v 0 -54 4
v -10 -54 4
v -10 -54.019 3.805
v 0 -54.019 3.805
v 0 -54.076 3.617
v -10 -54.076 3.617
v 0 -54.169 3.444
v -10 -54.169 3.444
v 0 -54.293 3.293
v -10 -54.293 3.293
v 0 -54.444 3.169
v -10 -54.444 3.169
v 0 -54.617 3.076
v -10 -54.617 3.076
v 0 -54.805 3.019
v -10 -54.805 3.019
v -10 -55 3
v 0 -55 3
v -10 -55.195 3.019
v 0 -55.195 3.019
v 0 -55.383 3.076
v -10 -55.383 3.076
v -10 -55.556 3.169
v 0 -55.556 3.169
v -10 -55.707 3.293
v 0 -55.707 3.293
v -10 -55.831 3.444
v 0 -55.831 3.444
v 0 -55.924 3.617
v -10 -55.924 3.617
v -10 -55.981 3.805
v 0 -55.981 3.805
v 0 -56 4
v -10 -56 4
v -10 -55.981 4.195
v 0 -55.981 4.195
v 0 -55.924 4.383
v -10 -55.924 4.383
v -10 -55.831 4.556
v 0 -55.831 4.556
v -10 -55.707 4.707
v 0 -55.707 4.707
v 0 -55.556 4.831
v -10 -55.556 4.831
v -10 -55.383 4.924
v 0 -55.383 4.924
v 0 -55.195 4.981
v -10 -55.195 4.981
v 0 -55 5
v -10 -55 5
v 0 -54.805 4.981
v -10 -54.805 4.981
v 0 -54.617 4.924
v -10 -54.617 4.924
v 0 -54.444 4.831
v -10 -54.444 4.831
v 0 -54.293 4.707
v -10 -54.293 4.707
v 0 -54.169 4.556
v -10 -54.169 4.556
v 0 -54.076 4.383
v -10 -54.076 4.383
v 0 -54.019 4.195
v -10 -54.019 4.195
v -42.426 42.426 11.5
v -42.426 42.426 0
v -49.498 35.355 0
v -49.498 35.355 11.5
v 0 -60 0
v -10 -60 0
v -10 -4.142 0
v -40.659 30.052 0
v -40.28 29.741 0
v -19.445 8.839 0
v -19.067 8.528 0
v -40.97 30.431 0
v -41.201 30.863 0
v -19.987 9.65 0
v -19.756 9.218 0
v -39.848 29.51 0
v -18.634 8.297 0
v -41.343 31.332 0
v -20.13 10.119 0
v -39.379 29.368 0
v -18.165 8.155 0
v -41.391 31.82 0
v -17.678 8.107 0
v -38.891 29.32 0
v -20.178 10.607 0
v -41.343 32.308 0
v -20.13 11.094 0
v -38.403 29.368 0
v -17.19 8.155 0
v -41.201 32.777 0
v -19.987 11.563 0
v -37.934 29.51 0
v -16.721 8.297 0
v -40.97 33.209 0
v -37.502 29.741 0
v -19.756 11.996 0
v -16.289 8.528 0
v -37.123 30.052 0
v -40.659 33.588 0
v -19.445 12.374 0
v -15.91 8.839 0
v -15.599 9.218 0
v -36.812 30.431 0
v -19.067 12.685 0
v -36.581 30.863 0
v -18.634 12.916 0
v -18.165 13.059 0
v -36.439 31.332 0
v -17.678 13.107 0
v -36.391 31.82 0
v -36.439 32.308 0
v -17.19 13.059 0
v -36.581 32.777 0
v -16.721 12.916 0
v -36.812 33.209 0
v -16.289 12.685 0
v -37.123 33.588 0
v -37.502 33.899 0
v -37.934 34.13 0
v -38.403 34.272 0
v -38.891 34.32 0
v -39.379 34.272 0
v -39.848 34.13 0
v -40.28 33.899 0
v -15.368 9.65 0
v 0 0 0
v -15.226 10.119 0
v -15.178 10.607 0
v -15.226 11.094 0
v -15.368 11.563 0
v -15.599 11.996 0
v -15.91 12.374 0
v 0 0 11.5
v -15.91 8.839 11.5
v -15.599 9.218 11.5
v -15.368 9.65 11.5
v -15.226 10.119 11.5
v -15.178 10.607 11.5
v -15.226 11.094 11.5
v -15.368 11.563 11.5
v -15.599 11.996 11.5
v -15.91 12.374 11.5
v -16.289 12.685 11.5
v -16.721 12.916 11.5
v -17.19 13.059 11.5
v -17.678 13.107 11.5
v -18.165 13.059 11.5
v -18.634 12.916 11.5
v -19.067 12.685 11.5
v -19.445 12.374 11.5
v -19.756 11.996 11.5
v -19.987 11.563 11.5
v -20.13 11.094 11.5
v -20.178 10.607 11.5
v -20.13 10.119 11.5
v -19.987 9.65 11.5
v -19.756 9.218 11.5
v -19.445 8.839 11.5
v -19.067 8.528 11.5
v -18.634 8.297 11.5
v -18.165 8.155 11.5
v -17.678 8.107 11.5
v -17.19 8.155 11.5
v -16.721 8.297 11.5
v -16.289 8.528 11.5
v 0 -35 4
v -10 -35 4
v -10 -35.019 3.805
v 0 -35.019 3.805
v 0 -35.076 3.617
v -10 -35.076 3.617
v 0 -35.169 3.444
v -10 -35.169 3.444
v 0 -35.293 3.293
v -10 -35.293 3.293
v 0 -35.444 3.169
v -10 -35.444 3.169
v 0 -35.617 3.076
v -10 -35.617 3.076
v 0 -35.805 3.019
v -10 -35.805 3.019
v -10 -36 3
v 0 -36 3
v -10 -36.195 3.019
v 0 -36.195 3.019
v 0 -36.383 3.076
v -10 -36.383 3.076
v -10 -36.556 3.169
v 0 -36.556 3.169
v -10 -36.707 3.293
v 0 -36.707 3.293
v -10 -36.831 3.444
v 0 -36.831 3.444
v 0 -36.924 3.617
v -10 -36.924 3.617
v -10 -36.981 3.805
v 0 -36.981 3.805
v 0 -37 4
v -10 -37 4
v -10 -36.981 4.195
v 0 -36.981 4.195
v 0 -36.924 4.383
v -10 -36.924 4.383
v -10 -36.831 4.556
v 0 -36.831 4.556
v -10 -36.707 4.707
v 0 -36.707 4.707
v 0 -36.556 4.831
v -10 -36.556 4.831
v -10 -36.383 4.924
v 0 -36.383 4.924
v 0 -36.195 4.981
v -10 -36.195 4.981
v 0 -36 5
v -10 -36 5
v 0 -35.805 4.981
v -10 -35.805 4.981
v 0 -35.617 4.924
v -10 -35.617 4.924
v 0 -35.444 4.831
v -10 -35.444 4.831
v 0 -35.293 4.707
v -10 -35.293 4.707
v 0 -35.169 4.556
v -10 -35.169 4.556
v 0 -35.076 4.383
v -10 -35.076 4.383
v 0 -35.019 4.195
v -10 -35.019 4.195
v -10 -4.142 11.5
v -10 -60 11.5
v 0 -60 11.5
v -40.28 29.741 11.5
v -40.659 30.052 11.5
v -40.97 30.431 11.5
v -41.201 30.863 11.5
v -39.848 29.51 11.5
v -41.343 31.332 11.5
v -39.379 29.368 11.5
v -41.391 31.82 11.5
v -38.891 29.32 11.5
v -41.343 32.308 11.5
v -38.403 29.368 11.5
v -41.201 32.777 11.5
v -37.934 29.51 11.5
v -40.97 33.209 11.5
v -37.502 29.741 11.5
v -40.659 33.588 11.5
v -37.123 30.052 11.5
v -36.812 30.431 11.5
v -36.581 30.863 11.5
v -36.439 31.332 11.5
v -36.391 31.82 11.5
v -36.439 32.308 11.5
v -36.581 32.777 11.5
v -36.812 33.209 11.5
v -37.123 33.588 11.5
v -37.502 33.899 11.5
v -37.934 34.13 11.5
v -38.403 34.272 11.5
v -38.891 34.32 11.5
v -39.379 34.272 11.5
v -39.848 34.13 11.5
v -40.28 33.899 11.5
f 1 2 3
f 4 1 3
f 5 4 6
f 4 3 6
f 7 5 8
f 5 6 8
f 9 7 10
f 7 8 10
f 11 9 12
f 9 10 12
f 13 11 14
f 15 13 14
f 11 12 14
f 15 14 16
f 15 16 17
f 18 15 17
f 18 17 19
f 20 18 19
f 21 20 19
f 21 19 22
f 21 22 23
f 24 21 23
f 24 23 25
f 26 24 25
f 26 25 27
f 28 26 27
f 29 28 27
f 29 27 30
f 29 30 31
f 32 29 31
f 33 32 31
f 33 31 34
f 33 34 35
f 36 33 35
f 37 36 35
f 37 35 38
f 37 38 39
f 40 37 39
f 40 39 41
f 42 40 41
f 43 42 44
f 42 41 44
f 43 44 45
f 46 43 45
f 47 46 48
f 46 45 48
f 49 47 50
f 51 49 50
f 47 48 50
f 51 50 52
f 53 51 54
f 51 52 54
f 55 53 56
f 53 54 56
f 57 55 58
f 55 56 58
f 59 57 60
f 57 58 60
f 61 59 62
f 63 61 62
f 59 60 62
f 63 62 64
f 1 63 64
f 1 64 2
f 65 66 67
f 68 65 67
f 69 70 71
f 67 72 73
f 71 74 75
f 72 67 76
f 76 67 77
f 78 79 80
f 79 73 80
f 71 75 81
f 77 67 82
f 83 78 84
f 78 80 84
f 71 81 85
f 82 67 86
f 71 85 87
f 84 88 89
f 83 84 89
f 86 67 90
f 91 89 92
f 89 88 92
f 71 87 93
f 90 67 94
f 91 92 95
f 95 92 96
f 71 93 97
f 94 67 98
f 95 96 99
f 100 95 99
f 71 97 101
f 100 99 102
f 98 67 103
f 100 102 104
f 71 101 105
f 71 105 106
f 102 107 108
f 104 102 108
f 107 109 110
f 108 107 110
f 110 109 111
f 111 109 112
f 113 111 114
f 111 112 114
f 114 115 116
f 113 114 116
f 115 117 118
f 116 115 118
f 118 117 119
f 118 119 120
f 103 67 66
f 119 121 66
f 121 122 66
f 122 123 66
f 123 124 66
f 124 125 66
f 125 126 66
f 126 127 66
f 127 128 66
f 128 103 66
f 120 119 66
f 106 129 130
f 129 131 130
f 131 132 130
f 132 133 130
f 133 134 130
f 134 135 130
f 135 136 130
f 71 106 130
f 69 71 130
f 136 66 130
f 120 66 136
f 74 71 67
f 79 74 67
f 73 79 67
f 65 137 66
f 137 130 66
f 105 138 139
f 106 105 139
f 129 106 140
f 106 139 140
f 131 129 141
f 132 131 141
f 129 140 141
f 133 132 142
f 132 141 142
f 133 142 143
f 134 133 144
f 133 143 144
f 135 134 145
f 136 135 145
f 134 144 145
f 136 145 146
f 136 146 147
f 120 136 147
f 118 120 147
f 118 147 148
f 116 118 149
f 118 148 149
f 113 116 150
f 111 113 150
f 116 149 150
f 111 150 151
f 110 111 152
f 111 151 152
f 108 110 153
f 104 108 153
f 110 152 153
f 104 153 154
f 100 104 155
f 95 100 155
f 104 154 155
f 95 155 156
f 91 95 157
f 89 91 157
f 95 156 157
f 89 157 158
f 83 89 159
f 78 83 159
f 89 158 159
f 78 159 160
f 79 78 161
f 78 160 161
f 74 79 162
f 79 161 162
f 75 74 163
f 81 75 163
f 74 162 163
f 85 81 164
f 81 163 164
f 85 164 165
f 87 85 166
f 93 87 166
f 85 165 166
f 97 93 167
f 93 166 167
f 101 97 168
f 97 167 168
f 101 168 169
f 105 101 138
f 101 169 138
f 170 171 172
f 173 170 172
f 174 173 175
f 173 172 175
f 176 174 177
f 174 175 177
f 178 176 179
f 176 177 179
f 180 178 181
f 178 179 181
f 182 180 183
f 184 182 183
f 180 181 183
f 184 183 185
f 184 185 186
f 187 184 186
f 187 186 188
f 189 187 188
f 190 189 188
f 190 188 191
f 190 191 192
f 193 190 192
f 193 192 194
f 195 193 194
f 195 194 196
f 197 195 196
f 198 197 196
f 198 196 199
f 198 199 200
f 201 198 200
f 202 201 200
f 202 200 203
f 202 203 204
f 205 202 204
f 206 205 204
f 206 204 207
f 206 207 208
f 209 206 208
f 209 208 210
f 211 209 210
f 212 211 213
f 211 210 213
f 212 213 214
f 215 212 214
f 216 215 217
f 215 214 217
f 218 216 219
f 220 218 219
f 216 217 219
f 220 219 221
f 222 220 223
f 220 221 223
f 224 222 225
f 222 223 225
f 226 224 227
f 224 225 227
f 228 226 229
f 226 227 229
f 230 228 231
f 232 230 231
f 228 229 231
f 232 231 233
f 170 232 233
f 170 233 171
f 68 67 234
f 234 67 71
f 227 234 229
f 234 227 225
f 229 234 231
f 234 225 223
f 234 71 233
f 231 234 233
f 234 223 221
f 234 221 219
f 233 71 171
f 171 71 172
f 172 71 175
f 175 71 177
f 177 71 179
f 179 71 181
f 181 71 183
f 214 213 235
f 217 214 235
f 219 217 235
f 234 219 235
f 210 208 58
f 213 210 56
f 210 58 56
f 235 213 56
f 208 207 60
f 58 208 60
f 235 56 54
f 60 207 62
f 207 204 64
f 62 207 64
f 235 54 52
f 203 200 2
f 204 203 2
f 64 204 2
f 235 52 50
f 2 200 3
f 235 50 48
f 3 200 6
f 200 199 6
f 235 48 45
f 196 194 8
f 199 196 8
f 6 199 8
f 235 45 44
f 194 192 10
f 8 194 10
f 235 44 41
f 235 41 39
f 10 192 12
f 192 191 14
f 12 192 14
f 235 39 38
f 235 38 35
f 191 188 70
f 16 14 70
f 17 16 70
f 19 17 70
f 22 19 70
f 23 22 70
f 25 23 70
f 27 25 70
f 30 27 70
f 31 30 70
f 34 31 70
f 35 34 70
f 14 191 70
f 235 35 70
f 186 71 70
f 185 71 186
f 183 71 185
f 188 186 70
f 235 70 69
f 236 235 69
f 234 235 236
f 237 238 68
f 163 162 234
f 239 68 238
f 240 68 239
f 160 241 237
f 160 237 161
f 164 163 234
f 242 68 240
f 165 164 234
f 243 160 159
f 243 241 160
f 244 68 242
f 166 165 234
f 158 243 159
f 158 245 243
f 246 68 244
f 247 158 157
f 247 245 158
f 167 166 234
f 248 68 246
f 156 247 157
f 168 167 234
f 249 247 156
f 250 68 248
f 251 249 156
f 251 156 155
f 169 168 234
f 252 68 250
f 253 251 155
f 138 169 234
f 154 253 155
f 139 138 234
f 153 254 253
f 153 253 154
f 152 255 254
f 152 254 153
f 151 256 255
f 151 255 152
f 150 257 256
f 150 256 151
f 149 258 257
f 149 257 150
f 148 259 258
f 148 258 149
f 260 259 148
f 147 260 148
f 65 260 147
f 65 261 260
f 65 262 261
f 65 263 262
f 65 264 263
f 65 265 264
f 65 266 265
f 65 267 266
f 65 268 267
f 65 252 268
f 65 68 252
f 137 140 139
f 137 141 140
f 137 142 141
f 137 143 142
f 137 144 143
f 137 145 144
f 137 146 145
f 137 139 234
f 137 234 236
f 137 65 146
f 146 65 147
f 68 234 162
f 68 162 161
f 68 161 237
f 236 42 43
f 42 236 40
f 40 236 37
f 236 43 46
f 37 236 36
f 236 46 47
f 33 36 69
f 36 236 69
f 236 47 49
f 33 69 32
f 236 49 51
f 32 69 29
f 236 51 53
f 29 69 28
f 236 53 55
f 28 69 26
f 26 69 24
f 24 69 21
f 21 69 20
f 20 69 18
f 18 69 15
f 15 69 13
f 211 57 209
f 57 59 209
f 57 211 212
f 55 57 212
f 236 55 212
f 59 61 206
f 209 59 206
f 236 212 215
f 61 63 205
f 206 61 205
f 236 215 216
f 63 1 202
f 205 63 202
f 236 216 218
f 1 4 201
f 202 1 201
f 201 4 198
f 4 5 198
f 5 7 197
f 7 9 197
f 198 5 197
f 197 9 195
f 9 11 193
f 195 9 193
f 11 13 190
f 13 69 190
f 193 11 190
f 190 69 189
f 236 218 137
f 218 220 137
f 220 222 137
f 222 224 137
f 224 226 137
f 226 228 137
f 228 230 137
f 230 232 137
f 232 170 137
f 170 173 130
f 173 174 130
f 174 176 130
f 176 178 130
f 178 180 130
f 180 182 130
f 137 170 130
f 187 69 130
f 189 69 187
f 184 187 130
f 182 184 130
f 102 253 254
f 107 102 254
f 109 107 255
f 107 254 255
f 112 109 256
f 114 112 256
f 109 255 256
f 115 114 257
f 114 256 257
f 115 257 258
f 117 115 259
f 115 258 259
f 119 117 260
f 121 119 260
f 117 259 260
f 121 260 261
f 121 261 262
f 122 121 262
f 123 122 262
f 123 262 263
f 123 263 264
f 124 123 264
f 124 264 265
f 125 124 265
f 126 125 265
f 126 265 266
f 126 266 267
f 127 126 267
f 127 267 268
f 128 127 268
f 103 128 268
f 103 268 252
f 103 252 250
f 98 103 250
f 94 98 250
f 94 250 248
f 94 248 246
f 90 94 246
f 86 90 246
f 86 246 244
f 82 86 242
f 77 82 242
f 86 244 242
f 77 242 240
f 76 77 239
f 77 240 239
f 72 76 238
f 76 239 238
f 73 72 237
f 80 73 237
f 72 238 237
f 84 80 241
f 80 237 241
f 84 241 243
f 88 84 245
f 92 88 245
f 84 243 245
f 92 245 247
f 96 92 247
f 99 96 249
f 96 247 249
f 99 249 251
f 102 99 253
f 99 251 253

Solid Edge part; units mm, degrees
sketch "Sketch1" plane through (0, 0, 0) normal (0, 0, 1) x (1, 0, 0)
  line L0 (-10, -60) -> (0, -60)
  line L1 (0, -60) -> (0, 0)
  line L2 (0, 0) -> (-42.4264, 42.4264)
  line L3 (-42.4264, 42.4264) -> (-49.4975, 35.3553)
  line L4 (-49.4975, 35.3553) -> (-10, -4.1421)
  line L5 (-10, -4.1421) -> (-10, -60)
  dimension "D1" = 10
  dimension "D2" = 10
  dimension "D3" = 60
  dimension "D4" = 60
extrude "Extrusionsausprägung_3" add sketch "Sketch1" along normal blind 11.5
sketch "Sketch2" plane through (-24.7487, -3.7868, 11.5) normal (0, 0, 1) x (0.7071, -0.7071, 0)
  circle A0 centre (-35.1777, 15.1777) radius 2.5
  circle A1 centre (-5.1777, 15.1777) radius 2.5
  dimension "D1" = 30
  dimension "D2" = 5
  dimension "D3" = 20
extrude "Cutout1" cut sketch "Sketch2" against normal up to next
sketch "Sketch3" plane through (-10, -32.0711, 5) normal (-1, 0, 0) x (0, 1, 0)
  circle A0 centre (-3.9289, 1) radius 1
  circle A1 centre (-22.9289, 1) radius 1
  dimension "D1" = 2
  dimension "D2" = 19
  dimension "D3" = 5
  dimension "D4" = 4
extrude "Cutout2" cut sketch "Sketch3" against normal up to next
properties material "Nylon, allgemein"
